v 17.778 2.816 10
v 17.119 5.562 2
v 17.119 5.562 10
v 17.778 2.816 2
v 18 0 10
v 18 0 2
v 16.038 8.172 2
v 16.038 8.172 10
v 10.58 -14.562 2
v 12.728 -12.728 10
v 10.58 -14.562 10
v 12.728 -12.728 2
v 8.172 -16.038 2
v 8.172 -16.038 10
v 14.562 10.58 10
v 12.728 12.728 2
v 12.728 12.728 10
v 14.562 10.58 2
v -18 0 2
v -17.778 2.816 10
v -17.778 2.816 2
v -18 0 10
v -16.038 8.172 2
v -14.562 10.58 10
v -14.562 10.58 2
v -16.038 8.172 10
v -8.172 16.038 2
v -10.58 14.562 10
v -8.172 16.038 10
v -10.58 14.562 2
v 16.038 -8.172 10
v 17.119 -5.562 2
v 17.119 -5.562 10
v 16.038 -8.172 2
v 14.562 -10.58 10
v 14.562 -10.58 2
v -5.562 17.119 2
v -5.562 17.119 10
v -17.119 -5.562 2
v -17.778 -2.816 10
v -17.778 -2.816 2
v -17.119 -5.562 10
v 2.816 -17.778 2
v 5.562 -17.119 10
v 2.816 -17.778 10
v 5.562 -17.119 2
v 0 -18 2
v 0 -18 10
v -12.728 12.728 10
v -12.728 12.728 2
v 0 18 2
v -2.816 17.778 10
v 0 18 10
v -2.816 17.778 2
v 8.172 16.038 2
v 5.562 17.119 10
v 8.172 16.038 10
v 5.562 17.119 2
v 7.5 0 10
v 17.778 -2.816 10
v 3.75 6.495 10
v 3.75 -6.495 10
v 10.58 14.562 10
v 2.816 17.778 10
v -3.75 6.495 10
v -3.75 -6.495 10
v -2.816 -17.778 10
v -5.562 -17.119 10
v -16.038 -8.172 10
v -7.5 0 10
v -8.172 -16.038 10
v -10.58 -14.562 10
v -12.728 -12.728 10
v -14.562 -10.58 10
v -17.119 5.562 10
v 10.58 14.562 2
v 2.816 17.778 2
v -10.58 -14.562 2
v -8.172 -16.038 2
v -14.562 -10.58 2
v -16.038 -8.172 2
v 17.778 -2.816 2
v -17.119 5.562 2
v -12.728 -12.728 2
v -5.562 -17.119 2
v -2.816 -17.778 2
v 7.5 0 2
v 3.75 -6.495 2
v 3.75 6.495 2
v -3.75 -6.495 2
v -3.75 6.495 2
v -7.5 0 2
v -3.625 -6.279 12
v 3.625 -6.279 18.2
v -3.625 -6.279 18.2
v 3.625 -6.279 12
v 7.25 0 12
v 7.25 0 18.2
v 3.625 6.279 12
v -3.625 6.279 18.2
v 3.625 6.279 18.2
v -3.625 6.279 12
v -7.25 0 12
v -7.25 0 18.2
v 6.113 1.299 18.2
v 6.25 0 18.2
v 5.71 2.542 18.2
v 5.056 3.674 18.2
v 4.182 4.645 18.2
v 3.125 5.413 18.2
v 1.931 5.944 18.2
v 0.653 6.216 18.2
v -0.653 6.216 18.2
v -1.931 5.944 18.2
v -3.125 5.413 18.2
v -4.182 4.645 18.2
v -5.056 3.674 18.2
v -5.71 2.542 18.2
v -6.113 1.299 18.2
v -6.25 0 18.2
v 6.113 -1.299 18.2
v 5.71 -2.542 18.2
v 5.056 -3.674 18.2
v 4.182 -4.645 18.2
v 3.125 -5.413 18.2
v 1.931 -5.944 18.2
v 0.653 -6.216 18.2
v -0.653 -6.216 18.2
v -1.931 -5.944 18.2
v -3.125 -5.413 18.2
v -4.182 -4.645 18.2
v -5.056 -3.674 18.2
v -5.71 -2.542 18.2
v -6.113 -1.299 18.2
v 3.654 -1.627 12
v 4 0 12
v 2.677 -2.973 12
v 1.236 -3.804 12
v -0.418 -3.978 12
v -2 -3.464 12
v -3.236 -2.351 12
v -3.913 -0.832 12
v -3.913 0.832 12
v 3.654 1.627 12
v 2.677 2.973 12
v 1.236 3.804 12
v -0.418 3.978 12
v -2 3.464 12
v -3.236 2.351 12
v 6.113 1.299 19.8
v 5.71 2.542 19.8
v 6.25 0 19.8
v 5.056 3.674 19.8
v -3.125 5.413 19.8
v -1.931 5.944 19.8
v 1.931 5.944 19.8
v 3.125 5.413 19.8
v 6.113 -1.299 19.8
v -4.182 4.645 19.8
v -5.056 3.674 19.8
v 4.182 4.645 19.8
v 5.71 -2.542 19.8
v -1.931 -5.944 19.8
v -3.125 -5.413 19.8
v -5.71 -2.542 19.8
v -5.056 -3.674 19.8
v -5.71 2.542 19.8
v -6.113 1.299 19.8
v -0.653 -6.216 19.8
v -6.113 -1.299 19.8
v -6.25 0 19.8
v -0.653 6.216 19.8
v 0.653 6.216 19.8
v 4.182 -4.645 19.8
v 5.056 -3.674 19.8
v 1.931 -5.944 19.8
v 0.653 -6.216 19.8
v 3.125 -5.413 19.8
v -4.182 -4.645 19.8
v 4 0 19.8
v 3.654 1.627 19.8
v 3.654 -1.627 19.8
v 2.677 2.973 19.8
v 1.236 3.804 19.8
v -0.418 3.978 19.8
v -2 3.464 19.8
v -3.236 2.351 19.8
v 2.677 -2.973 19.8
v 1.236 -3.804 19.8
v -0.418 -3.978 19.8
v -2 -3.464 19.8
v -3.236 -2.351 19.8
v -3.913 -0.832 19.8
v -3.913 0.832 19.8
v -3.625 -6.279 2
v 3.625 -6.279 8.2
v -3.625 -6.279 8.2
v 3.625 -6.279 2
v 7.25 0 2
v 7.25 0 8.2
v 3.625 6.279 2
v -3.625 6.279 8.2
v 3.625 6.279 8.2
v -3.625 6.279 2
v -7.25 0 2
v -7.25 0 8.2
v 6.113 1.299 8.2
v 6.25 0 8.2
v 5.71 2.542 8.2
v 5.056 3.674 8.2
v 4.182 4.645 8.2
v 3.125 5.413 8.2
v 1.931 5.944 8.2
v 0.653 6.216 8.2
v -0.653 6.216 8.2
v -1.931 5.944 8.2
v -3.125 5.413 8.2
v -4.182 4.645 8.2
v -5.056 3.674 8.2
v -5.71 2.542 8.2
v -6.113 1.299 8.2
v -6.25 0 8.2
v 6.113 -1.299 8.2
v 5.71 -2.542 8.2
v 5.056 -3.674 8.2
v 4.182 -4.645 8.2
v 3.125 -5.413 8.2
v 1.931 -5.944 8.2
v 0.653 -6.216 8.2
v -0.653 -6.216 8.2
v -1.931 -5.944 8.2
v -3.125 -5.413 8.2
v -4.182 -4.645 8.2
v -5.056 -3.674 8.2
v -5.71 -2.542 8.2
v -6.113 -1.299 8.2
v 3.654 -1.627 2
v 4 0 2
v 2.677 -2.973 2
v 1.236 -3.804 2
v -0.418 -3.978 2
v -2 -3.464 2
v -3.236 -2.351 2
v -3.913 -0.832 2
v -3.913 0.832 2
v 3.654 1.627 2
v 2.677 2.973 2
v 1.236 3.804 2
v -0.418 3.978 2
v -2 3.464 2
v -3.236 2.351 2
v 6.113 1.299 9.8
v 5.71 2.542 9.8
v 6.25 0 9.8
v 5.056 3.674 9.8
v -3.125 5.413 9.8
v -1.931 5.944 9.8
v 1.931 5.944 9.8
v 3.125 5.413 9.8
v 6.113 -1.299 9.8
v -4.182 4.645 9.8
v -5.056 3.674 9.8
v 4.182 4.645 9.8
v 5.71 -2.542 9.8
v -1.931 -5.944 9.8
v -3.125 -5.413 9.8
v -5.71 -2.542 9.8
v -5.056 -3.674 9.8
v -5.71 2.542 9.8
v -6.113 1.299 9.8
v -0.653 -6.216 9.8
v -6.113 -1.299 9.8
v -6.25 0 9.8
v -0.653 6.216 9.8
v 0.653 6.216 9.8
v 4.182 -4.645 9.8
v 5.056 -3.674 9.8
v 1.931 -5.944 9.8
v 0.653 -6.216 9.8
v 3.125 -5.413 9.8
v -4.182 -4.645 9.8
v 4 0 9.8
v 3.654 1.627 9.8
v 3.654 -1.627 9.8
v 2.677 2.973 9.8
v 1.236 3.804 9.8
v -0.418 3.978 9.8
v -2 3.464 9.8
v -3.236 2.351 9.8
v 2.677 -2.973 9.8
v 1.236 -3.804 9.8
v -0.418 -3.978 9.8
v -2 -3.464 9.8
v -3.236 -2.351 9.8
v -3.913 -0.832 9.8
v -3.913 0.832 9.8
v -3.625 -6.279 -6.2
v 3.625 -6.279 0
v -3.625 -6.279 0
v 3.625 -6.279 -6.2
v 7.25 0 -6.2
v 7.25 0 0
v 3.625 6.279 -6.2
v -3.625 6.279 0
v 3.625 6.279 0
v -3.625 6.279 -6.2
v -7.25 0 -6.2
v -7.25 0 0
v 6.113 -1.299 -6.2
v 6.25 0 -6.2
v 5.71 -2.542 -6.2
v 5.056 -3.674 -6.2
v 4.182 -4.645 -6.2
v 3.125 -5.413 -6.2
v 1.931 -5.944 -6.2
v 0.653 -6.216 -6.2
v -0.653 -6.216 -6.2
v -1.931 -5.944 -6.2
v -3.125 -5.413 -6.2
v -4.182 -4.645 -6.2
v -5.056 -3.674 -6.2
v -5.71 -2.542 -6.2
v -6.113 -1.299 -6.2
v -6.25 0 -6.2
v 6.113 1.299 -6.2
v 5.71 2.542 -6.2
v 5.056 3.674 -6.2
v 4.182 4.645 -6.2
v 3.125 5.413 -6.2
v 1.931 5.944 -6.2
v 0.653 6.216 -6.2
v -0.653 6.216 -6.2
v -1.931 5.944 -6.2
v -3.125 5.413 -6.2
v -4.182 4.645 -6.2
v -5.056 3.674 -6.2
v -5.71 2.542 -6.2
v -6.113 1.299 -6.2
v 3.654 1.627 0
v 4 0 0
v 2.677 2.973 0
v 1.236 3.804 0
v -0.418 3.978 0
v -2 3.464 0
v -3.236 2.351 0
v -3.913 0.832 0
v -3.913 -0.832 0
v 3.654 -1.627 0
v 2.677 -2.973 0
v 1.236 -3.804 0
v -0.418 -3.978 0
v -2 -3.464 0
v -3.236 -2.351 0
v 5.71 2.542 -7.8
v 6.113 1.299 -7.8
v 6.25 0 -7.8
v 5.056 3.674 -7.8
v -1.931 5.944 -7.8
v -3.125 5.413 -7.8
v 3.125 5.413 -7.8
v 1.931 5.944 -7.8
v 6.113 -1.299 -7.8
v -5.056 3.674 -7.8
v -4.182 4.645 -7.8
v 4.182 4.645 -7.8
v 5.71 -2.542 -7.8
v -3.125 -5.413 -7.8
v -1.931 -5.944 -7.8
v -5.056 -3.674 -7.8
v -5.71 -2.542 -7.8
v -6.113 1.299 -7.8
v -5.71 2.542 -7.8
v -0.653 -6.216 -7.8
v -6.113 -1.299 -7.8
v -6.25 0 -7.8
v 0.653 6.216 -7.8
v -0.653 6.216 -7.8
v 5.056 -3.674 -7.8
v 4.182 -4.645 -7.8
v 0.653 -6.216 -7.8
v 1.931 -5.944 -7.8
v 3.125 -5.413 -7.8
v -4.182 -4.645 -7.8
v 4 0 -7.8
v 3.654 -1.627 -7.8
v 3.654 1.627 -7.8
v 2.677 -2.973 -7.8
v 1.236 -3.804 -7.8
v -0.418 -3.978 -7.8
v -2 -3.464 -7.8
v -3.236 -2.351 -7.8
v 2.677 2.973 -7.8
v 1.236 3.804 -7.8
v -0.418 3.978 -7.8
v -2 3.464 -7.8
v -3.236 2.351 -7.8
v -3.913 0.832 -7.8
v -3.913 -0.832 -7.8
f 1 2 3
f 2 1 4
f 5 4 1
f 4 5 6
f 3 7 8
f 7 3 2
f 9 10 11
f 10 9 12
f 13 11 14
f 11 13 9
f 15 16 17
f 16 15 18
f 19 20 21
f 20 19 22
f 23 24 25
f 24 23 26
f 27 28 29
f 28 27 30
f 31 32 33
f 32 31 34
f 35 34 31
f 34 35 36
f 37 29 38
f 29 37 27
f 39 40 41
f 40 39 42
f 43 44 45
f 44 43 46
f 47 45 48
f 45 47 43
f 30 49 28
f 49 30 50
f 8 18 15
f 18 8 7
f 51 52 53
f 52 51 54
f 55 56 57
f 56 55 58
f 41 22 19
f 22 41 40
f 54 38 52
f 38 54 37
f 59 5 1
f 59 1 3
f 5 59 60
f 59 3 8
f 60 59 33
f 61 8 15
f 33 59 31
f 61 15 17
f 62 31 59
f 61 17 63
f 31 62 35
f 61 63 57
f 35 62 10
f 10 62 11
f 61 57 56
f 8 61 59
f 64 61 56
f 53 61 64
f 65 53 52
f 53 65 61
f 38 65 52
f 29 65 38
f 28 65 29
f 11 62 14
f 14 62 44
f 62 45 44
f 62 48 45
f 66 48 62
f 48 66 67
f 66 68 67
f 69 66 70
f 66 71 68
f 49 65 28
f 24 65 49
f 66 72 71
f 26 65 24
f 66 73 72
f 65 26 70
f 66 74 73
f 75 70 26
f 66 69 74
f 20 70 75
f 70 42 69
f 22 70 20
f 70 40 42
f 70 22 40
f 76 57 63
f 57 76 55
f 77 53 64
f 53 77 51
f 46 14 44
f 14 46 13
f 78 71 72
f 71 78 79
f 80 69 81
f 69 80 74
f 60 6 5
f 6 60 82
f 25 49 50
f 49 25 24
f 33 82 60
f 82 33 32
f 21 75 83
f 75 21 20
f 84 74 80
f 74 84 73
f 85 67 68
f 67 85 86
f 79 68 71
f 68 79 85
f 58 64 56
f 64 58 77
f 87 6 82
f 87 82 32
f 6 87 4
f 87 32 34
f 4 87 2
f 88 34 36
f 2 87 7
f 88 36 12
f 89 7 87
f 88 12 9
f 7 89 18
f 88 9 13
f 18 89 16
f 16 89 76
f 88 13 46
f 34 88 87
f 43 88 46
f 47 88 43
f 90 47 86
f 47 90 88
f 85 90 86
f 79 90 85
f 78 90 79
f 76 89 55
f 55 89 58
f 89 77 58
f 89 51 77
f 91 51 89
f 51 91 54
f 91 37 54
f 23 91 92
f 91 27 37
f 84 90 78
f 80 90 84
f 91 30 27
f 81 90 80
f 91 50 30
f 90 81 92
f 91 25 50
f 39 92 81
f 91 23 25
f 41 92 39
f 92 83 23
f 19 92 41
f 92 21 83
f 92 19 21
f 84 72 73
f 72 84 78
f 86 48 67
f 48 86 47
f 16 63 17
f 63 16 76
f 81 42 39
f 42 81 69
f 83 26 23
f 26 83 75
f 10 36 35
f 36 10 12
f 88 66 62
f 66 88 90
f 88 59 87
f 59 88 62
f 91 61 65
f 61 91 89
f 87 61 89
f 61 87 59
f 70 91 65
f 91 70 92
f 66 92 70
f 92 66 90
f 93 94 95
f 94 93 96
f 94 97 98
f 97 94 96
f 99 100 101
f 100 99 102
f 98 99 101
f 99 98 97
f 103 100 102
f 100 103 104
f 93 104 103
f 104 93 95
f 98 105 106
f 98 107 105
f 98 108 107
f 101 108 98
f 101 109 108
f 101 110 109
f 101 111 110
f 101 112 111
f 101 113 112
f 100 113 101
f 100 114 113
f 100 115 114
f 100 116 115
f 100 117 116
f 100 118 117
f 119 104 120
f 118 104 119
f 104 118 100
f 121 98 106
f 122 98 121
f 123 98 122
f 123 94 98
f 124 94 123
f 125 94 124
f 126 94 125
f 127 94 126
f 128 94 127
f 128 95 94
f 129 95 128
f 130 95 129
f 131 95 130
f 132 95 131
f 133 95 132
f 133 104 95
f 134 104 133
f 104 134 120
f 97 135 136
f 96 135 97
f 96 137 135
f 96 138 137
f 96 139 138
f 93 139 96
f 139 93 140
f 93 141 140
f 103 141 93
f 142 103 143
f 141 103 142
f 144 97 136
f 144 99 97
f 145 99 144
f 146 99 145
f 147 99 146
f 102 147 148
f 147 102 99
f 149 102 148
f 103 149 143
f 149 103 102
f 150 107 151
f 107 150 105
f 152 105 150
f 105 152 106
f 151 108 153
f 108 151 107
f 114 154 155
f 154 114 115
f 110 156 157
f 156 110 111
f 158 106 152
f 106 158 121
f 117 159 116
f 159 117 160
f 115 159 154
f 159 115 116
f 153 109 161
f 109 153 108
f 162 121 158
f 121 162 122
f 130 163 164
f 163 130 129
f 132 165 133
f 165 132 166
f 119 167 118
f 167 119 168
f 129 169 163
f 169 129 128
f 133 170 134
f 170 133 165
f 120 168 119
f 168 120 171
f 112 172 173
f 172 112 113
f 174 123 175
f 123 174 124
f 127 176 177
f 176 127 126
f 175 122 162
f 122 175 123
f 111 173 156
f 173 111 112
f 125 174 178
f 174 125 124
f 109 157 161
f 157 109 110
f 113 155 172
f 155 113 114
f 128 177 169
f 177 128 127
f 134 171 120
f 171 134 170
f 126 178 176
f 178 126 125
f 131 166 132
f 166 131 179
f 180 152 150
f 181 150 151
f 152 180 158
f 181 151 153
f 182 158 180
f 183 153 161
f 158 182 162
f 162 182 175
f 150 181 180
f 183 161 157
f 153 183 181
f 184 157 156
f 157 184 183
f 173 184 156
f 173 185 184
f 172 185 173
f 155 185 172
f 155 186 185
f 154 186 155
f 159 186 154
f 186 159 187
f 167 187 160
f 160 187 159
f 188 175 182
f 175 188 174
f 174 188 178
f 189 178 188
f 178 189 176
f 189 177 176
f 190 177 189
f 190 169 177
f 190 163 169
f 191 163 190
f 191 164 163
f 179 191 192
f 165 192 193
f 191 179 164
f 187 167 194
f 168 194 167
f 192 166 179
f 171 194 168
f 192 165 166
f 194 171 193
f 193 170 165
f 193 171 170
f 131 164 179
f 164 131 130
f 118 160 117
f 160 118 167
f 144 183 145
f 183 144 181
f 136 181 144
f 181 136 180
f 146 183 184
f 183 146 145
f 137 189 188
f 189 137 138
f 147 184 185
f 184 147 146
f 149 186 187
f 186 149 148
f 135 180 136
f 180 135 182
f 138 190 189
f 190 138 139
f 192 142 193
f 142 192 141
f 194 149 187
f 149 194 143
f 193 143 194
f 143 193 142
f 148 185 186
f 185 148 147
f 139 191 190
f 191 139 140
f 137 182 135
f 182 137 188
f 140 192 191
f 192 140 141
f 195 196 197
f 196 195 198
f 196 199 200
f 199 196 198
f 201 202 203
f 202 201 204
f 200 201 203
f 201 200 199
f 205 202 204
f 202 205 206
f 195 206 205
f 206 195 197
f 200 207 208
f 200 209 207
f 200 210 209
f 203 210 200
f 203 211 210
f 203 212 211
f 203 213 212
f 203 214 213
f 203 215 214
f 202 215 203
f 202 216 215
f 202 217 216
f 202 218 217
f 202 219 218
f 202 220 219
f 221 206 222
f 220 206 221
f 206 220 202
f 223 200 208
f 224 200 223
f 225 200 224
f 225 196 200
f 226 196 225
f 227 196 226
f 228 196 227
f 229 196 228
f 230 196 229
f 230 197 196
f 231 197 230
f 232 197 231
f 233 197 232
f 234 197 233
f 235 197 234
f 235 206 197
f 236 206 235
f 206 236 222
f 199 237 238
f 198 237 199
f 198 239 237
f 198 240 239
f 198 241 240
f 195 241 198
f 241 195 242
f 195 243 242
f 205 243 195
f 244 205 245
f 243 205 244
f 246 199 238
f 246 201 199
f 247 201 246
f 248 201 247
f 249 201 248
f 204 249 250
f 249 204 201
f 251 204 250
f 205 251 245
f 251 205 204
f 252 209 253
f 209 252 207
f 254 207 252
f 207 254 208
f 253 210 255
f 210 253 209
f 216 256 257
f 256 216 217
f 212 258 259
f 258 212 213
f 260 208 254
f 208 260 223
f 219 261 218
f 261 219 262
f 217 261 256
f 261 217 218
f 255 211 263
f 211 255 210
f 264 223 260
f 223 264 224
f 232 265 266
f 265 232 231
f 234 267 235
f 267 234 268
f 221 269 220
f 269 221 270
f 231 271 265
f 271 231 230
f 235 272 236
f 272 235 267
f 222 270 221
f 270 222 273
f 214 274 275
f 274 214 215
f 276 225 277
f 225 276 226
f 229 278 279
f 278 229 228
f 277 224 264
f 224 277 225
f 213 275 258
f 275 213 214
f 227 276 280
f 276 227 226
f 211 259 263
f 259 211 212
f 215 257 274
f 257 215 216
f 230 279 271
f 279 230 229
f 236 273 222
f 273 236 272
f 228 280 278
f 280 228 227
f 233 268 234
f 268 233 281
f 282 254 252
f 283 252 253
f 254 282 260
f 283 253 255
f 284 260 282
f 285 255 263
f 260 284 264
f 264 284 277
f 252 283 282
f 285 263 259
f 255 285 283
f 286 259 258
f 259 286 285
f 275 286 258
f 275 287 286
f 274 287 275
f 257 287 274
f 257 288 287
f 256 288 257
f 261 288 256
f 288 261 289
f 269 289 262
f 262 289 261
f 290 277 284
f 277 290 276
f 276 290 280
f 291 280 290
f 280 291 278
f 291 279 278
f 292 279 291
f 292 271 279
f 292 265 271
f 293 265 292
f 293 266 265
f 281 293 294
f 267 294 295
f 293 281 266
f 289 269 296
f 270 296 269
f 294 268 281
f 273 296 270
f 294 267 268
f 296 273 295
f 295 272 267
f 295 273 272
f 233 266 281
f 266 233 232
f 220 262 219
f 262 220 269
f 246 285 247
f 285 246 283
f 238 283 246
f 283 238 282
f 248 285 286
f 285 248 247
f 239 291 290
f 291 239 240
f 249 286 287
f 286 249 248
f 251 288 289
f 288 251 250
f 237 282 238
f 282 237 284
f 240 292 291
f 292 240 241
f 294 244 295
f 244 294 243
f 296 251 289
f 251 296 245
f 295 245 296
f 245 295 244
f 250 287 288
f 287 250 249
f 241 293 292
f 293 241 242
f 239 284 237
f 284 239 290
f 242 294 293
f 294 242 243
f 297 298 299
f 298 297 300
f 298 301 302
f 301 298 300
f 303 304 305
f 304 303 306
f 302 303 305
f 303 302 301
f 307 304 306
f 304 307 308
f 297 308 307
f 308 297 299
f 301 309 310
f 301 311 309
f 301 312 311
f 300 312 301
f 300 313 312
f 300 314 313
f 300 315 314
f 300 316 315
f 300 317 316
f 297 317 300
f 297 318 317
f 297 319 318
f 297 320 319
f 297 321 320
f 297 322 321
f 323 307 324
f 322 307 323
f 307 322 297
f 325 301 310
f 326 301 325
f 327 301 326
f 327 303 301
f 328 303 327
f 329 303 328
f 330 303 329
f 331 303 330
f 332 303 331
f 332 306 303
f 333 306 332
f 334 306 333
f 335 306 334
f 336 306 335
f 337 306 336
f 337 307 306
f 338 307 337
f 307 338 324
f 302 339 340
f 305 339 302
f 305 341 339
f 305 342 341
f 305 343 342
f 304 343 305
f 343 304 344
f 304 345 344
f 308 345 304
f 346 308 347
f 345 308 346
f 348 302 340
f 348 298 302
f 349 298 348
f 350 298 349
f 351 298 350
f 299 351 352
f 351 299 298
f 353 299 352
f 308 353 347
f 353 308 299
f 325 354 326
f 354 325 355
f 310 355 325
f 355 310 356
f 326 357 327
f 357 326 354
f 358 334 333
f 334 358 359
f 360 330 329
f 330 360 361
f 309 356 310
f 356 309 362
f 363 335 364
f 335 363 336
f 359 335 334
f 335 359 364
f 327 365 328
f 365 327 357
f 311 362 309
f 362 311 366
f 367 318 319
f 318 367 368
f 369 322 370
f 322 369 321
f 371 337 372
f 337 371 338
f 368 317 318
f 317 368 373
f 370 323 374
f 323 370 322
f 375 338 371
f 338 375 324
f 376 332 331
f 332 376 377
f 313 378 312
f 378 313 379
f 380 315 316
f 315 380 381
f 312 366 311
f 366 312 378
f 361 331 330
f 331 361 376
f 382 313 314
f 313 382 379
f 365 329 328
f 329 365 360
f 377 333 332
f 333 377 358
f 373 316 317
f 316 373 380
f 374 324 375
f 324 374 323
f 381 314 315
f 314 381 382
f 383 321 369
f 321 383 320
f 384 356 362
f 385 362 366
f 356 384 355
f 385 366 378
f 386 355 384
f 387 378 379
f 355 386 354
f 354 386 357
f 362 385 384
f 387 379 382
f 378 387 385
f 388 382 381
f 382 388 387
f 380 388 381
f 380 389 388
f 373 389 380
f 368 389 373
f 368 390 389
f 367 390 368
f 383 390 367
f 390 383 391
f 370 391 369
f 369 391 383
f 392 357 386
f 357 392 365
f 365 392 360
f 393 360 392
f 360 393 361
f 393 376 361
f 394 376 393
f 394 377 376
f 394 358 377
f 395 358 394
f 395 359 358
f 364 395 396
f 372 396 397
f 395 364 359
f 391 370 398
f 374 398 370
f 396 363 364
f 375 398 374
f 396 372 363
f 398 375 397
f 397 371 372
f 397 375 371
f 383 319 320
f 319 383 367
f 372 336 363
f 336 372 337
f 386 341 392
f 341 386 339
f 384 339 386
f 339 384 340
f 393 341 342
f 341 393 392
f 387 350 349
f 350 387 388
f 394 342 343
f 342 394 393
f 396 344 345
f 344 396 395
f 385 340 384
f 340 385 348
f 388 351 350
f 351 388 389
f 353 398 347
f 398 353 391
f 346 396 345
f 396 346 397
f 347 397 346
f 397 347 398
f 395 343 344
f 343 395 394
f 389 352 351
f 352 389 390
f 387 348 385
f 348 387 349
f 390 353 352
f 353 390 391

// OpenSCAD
module shaiba() {
difference() {
	cylinder(2,r=20,$fn=40);
	translate([0,0,-0.5])cylinder(3,r=4,$fn=15);
}}

module shkiv() {
difference() {
	cylinder(8,r=18,$fn=40);
	translate([0,0,-0.5])cylinder(9,r=7.5,$fn=6);
}}

module nut_nylon() {
color([0.7,1,1])
difference() {
union() {
	cylinder(6.2,r=14.5/2,$fn=6);
	translate([0,0,6.2])cylinder(7.8-6.2,r=12.5/2,$fn=30);
}
	translate([0,0,-0.5])cylinder(9,r=4,$fn=15);
}}

%translate([0,0,-19])cylinder(50,r=4);

%translate([0,0,10])shaiba();
translate([0,0,2])shkiv();
translate([0,0,12])nut_nylon();
translate([0,0,2])nut_nylon();
mirror([0,0,1])nut_nylon();
%translate([0,0,0])shaiba();
